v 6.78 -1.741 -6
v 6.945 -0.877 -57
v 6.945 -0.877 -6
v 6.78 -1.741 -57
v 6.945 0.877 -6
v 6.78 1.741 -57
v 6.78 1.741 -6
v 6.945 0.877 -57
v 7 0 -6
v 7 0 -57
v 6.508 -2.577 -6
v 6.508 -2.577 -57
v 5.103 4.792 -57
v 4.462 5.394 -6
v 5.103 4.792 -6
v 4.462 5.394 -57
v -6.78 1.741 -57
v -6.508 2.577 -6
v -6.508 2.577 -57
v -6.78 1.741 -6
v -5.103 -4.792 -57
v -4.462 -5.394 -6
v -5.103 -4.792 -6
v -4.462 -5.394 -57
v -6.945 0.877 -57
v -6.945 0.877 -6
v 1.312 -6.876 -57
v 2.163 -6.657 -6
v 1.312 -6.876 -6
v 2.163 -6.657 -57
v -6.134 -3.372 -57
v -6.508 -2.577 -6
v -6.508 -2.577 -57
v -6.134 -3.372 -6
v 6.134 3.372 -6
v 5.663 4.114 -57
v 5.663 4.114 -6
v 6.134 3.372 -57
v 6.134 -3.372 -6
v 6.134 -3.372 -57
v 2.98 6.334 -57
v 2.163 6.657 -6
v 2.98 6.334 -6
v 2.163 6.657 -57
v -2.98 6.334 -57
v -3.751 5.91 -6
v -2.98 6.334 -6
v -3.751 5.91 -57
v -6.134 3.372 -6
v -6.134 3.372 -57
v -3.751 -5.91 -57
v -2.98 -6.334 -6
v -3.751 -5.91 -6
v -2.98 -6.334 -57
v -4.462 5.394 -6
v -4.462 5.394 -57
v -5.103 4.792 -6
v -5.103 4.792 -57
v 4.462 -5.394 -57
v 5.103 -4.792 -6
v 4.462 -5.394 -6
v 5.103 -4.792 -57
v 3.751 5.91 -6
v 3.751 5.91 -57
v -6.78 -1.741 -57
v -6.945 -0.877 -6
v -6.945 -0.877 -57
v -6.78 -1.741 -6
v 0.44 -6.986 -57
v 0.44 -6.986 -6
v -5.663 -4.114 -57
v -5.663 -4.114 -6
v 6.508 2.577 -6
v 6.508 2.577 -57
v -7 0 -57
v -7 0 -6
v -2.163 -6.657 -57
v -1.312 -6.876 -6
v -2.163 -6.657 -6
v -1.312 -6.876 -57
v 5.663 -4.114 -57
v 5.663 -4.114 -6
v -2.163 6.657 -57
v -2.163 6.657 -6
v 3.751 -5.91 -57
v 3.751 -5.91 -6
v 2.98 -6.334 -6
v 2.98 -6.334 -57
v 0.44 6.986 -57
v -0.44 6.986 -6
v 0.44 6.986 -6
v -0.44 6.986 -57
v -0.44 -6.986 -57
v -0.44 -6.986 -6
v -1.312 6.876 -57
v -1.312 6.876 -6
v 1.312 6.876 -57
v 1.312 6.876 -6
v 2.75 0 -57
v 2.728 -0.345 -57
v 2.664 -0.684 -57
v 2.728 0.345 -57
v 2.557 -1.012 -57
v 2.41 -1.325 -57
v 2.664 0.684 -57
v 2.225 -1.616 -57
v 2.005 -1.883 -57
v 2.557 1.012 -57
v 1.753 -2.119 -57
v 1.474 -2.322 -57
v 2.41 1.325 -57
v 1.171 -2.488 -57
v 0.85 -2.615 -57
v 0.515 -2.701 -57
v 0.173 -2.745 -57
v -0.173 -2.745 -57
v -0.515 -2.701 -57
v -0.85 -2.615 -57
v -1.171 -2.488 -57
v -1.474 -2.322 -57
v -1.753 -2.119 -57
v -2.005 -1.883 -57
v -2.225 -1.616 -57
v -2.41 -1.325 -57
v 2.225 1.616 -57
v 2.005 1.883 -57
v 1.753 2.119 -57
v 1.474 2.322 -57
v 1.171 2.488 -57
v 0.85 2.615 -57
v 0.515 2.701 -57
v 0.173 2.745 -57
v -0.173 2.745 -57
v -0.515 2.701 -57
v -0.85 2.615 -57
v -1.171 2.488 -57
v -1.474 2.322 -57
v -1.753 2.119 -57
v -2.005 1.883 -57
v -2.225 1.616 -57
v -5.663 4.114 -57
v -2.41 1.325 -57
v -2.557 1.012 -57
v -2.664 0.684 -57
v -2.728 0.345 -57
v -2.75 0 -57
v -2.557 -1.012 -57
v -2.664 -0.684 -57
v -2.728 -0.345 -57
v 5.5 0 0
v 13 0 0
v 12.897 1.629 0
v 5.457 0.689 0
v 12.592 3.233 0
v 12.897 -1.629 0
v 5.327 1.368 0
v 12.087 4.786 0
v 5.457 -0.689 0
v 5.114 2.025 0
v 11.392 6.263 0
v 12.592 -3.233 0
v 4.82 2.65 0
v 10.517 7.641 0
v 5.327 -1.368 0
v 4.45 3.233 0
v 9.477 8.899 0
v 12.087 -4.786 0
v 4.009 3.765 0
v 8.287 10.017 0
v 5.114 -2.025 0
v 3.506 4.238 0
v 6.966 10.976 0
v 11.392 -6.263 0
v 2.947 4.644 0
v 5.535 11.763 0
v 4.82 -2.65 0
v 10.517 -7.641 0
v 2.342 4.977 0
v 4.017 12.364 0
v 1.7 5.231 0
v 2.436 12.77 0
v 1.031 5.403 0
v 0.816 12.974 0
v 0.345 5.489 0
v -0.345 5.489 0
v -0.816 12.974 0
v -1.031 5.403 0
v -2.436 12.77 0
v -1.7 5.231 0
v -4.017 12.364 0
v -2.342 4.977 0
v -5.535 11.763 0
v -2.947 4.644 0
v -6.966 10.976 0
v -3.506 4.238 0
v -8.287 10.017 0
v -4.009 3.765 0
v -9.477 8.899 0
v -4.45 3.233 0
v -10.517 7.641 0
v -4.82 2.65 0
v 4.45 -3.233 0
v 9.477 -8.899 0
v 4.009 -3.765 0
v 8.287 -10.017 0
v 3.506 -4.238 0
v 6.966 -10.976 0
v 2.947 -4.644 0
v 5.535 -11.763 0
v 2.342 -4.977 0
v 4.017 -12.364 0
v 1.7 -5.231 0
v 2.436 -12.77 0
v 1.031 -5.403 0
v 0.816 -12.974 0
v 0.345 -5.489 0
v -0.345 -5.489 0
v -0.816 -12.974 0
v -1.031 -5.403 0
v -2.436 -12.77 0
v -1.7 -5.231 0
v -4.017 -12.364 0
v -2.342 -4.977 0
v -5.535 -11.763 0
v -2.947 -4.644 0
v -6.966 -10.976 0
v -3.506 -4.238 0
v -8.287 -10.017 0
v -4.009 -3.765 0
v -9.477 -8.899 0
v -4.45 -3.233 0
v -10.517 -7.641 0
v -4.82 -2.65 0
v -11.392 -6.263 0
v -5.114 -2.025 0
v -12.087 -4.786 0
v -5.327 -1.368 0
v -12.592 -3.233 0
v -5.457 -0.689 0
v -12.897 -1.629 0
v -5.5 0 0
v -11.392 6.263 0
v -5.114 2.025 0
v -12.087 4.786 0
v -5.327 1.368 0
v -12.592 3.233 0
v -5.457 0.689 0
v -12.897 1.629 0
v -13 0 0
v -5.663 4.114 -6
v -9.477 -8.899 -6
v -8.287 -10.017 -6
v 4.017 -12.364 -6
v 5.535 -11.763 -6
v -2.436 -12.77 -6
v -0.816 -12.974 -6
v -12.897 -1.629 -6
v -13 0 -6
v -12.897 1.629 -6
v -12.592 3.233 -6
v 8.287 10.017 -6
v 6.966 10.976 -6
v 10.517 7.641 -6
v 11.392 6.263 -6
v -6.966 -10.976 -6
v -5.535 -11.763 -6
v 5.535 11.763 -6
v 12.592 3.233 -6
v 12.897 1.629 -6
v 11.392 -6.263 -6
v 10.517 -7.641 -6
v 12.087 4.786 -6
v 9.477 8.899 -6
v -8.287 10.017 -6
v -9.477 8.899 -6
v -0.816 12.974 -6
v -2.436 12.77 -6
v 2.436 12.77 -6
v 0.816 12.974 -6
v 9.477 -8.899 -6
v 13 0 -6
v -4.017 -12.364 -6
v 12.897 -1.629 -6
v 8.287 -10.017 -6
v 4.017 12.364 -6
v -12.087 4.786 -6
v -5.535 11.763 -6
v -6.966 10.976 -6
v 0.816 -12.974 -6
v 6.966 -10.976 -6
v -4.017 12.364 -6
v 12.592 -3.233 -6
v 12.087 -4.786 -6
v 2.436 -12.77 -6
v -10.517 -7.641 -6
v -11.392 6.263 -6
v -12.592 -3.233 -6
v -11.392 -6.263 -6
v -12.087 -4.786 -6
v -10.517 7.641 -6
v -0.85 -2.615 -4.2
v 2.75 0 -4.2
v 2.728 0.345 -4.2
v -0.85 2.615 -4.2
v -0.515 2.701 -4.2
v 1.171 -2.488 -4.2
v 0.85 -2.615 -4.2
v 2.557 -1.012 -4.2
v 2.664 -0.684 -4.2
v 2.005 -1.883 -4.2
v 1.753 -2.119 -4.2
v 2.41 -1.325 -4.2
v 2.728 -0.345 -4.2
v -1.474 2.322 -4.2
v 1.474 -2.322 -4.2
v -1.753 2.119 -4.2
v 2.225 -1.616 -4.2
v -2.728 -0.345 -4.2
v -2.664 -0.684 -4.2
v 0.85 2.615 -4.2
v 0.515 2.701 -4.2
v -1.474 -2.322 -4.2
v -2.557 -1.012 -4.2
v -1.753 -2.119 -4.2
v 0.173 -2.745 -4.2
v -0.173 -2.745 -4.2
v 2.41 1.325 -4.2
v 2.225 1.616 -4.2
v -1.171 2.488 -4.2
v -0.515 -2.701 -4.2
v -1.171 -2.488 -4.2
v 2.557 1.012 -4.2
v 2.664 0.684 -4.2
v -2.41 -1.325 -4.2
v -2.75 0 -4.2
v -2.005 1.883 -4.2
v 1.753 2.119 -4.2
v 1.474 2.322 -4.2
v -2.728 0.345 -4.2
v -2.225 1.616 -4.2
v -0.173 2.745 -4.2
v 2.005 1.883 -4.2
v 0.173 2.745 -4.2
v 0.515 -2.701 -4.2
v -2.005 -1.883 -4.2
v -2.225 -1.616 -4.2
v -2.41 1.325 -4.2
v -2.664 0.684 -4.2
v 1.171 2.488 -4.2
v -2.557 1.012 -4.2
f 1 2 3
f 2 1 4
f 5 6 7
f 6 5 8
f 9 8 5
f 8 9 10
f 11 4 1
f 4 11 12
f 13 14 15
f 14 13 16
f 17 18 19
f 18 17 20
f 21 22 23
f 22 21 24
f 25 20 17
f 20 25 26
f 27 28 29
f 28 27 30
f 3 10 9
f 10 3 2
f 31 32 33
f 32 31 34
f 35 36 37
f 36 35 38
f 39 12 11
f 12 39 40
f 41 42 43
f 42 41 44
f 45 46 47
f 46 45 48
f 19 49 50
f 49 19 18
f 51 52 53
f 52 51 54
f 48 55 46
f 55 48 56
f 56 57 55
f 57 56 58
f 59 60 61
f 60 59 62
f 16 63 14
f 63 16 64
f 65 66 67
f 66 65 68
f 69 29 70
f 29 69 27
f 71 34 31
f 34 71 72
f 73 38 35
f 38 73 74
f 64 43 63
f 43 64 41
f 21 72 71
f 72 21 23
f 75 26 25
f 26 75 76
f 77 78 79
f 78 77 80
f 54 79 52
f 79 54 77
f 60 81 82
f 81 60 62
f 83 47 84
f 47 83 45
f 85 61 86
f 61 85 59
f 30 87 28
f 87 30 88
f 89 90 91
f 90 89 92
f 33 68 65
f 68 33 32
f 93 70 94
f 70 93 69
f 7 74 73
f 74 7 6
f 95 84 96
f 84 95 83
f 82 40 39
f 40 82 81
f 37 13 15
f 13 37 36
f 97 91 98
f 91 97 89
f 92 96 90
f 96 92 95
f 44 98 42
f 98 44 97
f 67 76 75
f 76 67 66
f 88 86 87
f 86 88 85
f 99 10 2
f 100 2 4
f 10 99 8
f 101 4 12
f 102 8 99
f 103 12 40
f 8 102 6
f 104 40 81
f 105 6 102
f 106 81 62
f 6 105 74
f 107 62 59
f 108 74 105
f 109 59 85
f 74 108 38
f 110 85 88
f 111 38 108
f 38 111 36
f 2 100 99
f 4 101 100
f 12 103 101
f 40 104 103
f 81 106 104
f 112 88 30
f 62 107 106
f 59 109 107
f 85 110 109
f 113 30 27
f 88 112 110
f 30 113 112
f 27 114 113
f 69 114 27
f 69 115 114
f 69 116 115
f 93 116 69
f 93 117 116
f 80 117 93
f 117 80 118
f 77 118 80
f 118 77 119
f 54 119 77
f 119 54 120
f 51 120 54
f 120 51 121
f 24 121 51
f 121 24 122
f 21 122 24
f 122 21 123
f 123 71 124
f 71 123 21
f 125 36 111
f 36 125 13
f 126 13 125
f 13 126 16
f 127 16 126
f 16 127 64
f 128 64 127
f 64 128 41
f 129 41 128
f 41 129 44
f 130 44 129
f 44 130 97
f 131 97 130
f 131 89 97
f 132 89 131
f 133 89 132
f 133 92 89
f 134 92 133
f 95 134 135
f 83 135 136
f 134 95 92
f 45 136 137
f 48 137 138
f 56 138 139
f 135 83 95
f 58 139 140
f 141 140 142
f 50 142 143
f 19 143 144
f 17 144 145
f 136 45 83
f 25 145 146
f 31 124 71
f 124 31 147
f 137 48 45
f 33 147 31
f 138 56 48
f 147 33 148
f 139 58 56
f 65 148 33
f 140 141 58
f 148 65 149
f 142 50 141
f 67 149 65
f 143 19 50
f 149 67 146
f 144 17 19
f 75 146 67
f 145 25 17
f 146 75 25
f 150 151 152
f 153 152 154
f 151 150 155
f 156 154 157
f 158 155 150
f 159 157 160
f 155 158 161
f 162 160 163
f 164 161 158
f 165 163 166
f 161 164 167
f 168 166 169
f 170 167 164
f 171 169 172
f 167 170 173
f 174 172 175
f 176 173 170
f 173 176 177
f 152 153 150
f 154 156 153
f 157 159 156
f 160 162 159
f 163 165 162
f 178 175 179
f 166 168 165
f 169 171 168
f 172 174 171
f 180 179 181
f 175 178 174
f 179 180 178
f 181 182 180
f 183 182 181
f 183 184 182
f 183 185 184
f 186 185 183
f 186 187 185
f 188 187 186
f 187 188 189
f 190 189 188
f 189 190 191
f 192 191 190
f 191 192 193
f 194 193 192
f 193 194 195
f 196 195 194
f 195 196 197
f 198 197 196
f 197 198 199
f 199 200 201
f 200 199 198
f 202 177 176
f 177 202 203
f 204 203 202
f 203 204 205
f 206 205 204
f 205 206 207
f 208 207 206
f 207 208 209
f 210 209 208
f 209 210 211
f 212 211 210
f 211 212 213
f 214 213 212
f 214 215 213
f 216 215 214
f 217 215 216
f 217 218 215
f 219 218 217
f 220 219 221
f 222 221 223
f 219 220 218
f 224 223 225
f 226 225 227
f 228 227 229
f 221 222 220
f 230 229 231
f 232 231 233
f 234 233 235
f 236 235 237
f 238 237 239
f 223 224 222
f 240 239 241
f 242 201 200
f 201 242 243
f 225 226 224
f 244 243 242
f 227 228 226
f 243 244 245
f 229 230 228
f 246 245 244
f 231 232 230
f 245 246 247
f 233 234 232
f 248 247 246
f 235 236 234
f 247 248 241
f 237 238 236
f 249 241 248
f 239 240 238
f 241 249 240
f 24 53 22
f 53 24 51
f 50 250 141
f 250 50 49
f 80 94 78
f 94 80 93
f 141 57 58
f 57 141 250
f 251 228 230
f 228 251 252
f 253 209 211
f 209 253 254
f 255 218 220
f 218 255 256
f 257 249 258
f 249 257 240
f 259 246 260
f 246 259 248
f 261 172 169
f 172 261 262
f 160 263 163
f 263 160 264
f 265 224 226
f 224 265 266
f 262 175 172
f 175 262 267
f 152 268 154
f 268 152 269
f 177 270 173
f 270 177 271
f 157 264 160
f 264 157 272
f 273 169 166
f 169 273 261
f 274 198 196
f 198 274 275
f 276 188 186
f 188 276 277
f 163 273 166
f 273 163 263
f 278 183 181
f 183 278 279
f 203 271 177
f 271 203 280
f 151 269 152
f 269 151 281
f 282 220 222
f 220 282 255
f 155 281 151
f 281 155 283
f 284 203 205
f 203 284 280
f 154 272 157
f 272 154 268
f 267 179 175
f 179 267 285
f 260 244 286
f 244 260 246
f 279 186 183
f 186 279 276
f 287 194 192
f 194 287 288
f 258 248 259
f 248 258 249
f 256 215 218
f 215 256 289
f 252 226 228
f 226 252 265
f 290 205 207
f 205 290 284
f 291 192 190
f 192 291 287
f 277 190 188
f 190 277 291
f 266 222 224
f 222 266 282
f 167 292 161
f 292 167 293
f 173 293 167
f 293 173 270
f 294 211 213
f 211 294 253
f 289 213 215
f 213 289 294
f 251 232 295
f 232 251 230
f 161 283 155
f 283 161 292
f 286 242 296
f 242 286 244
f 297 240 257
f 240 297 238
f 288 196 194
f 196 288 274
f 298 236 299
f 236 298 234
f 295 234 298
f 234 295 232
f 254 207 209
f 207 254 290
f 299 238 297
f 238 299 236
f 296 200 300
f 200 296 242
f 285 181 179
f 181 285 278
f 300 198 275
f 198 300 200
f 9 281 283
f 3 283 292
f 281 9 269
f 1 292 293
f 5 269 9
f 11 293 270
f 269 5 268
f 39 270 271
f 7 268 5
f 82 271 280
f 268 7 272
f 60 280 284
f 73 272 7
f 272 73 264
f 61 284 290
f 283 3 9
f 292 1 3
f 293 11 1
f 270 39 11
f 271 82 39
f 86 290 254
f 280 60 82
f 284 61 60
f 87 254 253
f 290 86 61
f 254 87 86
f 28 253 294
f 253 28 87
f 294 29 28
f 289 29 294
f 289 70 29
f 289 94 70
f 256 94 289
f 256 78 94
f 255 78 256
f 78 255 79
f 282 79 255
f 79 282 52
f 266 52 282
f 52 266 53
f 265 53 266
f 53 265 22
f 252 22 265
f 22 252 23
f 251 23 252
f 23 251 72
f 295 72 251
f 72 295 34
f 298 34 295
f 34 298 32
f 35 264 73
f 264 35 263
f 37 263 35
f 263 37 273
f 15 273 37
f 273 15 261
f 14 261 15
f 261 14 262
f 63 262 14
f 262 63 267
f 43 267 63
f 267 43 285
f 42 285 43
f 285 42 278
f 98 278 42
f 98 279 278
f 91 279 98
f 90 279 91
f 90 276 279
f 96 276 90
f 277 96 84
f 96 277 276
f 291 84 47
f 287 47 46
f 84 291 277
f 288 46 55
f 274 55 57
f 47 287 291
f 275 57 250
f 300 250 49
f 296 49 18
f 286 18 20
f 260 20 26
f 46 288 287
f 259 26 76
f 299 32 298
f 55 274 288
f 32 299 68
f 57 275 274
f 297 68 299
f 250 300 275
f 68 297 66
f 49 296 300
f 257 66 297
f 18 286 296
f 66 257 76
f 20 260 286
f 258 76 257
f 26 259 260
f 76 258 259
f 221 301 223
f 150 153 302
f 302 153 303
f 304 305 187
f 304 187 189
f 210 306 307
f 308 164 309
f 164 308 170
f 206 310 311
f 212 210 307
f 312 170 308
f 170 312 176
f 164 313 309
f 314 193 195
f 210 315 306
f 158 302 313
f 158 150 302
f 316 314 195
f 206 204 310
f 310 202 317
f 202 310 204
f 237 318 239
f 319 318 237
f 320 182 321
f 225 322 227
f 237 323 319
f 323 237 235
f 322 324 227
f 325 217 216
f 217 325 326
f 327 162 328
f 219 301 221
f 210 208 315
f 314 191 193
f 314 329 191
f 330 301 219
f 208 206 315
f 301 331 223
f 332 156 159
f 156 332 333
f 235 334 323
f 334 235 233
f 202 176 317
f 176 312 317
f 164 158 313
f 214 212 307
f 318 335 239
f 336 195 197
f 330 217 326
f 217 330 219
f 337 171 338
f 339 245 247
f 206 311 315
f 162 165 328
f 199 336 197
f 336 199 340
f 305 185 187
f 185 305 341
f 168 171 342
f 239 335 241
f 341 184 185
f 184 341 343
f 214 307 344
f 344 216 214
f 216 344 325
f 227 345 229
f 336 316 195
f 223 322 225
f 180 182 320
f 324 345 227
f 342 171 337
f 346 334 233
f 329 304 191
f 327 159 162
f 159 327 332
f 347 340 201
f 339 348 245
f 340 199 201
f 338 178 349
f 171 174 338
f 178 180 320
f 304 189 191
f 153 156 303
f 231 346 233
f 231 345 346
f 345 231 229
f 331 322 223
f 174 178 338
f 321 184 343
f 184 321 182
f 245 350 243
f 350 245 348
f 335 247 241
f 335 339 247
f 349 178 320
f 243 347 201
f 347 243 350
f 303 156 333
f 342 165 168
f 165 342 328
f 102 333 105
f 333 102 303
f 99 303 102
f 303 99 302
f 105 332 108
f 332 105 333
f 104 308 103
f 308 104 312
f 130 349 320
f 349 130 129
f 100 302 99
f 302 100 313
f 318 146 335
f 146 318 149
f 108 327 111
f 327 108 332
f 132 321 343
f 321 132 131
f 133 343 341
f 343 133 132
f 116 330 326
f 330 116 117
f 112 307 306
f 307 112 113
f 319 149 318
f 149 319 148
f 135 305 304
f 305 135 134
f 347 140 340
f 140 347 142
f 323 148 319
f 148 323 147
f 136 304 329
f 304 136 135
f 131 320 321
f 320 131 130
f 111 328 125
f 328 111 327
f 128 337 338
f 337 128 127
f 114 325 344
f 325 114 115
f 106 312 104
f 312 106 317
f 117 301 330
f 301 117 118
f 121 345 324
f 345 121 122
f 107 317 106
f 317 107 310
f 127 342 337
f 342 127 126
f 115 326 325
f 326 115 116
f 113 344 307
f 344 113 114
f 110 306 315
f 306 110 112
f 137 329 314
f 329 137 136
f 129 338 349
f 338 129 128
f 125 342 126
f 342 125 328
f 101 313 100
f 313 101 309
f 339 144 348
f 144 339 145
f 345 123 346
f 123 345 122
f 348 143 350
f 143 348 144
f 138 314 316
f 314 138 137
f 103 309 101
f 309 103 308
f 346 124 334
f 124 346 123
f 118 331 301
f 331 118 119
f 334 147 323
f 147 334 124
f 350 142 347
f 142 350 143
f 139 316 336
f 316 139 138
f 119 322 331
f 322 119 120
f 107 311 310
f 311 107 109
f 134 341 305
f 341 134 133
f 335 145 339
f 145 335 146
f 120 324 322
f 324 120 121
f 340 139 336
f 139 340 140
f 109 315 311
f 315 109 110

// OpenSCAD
$fn = 50;


difference() {
	union() {
		translate(v = [0, 0, -57.0000000000]) {
			cylinder(h = 57, r = 7.0000000000);
		}
		translate(v = [0, 0, -6.0000000000]) {
			cylinder(h = 6, r = 13.0000000000);
		}
	}
	union() {
		translate(v = [0, 0, 0]) {
			rotate(a = [0, 0, 0]) {
				difference() {
					union() {
						#translate(v = [0, 0, -57.0000000000]) {
							cylinder(h = 57, r = 2.2500000000);
						}
						#translate(v = [0, 0, -4.2000000000]) {
							cylinder(h = 4.2000000000, r = 7.0000000000, r1 = 2.7500000000, r2 = 5.5000000000);
						}
						#translate(v = [0, 0, -57.0000000000]) {
							cylinder(h = 57, r = 2.7500000000);
						}
						#translate(v = [0, 0, -57.0000000000]) {
							cylinder(h = 57, r = 2.2500000000);
						}
					}
					union();
				}
			}
		}
	}
}
